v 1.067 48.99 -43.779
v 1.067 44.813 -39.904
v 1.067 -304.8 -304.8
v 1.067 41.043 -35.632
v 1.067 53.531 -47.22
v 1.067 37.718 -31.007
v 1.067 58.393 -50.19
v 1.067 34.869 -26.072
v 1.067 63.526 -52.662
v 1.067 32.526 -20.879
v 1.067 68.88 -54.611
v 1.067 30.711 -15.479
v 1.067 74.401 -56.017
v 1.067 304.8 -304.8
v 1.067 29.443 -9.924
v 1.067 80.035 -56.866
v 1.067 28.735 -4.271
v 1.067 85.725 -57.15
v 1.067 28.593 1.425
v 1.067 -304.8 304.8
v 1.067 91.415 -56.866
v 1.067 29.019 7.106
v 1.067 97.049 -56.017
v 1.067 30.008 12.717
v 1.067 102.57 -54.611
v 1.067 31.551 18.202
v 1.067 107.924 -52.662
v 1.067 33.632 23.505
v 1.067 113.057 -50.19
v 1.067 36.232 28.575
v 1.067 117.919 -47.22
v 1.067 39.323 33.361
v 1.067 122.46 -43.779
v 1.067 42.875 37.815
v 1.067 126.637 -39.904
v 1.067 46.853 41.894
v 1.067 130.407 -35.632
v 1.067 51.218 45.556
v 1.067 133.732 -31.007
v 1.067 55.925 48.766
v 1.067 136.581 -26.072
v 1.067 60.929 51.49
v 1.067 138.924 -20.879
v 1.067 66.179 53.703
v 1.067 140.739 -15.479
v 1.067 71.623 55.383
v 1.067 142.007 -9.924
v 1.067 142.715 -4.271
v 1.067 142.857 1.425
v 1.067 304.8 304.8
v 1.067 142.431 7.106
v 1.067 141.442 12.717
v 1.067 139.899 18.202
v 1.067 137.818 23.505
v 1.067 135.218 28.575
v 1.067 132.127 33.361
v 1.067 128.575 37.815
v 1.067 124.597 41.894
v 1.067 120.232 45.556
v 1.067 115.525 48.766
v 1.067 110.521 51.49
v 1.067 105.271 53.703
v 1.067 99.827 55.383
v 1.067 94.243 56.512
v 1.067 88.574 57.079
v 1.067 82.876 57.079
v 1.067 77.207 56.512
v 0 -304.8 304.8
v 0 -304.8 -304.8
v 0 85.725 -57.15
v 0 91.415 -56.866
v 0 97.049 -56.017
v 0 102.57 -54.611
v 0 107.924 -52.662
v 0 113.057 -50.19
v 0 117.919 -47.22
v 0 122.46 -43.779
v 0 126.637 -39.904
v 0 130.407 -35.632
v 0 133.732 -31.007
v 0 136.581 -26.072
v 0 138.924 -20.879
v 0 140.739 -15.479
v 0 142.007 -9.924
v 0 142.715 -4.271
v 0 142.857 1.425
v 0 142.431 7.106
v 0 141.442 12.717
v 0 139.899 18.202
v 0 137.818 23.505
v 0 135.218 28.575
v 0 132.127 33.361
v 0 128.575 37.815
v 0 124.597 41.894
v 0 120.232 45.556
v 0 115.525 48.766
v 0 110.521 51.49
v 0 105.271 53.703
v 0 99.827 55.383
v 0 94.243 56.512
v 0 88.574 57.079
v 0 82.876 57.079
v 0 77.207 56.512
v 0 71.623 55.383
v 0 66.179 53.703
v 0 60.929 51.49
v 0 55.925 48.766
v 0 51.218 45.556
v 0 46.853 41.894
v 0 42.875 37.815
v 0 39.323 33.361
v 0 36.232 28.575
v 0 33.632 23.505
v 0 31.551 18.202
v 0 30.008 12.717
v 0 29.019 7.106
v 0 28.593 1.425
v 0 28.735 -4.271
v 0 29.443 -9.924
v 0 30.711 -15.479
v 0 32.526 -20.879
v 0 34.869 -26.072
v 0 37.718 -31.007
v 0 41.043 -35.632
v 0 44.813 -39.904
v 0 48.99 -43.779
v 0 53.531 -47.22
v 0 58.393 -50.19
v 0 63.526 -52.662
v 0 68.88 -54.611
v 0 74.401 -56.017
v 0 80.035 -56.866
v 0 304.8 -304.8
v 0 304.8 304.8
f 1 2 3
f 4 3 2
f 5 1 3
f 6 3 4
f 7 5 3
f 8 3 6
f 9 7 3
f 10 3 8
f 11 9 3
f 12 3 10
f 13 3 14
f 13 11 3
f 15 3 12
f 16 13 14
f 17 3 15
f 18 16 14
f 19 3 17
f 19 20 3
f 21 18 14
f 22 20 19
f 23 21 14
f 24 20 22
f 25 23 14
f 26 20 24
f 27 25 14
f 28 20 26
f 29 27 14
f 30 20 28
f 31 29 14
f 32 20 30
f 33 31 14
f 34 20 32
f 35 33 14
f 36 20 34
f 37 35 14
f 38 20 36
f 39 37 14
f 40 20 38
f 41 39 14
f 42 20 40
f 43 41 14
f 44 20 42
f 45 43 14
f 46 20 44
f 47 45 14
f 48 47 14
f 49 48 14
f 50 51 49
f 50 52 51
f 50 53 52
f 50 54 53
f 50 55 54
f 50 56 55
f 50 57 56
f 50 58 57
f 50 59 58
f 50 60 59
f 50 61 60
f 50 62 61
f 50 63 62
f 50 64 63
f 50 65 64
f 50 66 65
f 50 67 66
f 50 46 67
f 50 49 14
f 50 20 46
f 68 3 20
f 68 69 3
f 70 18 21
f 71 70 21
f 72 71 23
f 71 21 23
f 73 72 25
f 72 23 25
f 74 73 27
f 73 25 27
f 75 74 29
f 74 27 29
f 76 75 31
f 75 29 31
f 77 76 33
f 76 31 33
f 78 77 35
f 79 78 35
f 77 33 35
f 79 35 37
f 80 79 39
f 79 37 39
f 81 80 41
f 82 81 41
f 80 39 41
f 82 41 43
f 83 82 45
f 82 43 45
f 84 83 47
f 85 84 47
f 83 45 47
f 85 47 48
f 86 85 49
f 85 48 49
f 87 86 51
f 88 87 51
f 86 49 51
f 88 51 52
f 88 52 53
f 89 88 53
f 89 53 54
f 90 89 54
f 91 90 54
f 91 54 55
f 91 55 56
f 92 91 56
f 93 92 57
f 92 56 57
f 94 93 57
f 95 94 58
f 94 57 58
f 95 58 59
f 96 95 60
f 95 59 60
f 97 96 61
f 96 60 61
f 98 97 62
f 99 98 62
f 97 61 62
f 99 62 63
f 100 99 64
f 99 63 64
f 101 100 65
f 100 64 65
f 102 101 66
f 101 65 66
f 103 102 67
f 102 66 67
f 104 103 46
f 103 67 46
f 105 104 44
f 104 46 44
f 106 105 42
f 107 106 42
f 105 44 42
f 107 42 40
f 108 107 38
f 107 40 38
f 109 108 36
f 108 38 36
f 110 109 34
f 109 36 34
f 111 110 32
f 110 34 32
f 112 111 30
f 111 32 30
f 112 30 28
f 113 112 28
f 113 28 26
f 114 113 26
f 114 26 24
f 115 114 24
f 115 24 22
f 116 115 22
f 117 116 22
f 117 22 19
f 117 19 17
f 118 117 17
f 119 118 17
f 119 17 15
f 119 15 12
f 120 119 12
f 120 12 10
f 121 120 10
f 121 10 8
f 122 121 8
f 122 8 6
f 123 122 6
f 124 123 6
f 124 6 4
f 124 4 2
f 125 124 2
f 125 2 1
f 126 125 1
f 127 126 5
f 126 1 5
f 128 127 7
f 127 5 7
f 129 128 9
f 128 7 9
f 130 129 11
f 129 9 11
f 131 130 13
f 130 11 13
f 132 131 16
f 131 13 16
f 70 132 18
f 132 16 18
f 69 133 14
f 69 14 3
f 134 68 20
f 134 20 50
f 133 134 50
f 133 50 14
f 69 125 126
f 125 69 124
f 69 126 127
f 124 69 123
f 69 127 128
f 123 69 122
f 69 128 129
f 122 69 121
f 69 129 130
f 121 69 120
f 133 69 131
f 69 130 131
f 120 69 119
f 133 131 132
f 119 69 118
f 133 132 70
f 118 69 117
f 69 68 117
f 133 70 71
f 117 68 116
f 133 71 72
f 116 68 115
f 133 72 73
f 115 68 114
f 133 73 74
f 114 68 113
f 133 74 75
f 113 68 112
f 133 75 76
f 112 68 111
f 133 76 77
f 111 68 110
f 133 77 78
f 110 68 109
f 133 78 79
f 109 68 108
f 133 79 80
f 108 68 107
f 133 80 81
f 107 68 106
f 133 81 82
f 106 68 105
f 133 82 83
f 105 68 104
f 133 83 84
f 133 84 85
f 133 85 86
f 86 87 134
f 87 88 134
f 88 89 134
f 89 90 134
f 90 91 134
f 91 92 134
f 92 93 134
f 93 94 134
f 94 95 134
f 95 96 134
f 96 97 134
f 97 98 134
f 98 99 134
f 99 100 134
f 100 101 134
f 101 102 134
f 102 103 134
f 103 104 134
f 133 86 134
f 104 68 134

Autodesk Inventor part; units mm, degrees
ref_plane "YZ Plane" through (0, 0, 0) normal (1, 0, 0) x (0, 1, 0)
ref_plane "XZ Plane" through (0, 0, 0) normal (0, 1, 0) x (-1, 0, 0)
ref_plane "XY Plane" through (0, 0, 0) normal (0, 0, 1) x (1, 0, 0)
sketch "Sketch1" plane through (0, 0, 0) normal (1, 0, 0) x (0, 1, 0)
  line L0 (-304.8, 304.8) -> (304.8, 304.8)
  line L1 (304.8, 304.8) -> (304.8, -304.8)
  line L2 (304.8, -304.8) -> (-304.8, -304.8)
  line L3 (-304.8, -304.8) -> (-304.8, 304.8)
  line L4 (-304.8, 304.8) -> (304.8, -304.8) construction
  line L5 (304.8, 304.8) -> (-304.8, -304.8) construction
  point P0 (0, 0)
  dimension "d0" = 609.6
  dimension "d1" = 609.6
extrude "Extrusion1" add sketch "Sketch1" along normal blind 1.0668
sketch "Sketch2" plane through (1.0668, 0, 0) normal (1, 0, 0) x (0, 0, -1)
  circle A0 centre (0, 85.725) radius 57.15
  line L0 (-304.8, -304.8) -> (304.8, -304.8) projected
  dimension "d4" = 114.3
  dimension "d7" = 390.525
extrude "Extrusion2" cut sketch "Sketch2" against normal through all
properties part number "2221A_Copper Box Side_Hole_V1" material "Copper"
